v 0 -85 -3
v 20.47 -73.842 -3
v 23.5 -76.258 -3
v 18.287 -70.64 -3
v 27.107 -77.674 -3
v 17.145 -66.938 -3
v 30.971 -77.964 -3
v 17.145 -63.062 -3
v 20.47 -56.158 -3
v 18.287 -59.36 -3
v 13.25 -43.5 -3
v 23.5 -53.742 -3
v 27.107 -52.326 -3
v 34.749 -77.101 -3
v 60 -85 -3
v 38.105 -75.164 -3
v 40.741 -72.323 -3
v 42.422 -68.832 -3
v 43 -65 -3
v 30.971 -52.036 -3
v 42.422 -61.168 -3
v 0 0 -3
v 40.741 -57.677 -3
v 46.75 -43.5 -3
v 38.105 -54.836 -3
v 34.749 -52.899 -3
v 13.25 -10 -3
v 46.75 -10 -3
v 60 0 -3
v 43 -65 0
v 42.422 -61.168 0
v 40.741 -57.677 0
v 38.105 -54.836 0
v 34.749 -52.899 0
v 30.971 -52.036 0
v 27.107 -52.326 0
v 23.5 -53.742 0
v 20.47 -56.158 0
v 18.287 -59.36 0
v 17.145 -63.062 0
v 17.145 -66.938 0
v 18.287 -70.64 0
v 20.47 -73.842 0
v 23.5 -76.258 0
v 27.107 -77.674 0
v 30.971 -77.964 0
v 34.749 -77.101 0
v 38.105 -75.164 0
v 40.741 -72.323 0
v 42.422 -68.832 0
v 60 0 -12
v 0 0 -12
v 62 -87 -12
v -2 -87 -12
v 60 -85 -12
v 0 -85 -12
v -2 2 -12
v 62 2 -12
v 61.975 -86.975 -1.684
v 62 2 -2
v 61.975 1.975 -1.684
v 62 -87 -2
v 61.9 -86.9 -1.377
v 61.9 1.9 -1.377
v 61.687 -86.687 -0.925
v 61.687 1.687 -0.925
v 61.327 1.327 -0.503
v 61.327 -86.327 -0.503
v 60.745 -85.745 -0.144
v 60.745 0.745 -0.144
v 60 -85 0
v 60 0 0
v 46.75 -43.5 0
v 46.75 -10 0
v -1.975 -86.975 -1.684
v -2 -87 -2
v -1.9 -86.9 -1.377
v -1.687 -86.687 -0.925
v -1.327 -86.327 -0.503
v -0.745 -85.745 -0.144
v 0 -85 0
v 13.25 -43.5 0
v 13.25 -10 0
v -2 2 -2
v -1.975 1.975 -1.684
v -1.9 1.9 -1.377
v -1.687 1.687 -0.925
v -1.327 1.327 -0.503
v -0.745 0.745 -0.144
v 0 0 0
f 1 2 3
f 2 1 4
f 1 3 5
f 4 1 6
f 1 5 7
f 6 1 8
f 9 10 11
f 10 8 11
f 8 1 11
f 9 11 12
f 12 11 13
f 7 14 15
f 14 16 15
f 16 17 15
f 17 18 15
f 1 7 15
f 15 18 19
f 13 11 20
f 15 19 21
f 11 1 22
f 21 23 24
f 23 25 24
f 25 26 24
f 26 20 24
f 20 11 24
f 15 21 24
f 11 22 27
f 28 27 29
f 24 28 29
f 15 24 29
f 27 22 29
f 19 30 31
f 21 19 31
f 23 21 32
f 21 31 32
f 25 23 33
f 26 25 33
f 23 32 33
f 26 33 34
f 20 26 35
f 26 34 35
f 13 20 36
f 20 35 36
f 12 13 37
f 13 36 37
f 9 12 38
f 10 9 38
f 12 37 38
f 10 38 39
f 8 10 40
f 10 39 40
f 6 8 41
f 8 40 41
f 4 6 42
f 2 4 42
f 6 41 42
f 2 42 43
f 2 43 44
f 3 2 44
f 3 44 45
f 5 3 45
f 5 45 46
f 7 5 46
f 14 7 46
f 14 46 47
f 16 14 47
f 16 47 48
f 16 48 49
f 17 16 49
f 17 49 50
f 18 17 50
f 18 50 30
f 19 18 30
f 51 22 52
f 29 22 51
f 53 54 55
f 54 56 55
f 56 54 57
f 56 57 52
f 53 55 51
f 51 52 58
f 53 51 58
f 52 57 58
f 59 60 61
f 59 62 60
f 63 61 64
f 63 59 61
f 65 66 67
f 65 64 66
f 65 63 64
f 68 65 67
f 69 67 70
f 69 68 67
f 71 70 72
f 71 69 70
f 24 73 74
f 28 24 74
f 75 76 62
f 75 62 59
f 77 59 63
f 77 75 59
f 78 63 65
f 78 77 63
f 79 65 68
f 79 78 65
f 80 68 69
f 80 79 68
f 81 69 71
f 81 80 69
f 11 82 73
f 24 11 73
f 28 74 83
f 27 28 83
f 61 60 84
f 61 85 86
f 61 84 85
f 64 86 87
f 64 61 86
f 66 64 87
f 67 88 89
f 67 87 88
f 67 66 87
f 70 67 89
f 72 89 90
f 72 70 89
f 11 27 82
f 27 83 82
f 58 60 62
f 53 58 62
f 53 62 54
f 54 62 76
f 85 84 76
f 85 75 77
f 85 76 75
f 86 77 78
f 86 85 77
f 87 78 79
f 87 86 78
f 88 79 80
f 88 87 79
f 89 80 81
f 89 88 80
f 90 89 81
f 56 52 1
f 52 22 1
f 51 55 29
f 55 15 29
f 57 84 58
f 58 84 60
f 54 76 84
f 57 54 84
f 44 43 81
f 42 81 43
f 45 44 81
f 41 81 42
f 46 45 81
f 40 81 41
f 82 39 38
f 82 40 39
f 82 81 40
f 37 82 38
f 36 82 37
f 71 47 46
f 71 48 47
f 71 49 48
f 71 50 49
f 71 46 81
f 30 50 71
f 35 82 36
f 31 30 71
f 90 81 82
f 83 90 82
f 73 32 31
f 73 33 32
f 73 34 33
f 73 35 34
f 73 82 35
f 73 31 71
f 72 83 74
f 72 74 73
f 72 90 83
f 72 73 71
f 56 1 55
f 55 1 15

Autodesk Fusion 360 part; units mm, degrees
sketch "Sketch1" plane through (0, 0, 0) normal (0, 0, 1) x (1, 0, 0)
  line L0 (0, 0) -> (60, 0)
  line L1 (0, 0) -> (0, -85)
  line L2 (0, -85) -> (60, -85)
  line L3 (60, -85) -> (60, 0)
  line L4 (30, -10) -> (46.75, -10)
  line L5 (46.75, -10) -> (13.25, -10)
  line L6 (13.25, -10) -> (13.25, -43.5)
  line L7 (13.25, -43.5) -> (46.75, -43.5)
  line L8 (46.75, -43.5) -> (46.75, -10)
  circle A0 centre (30, -65) radius 13
  line L9 (62, -87) -> (-2, -87)
  line L10 (-2, -87) -> (-2, 2)
  line L11 (-2, 2) -> (62, 2)
  line L12 (62, 2) -> (62, -87)
  dimension "d1" = 60
  dimension "d2" = 85
  dimension "d3" = 60
  dimension "d4" = 16.75
  dimension "d5" = 33.5
  dimension "d6" = 33.5
  dimension "d7" = 33.5
  dimension "d8" = 26
extrude "Extrude1" add sketch "Sketch1" against normal blind 3 contours L0 L1 L2 L3 | L9 L10 L11 L12
extrude "Extrude2" add sketch "Sketch1" against normal blind 12 contours L9 L10 L11 L12
fillet "Fillet1" radius 2 4 edges at (-2, -42.5, 0) (30, 2, 0) (62, -42.5, 0) (30, -87, 0)
